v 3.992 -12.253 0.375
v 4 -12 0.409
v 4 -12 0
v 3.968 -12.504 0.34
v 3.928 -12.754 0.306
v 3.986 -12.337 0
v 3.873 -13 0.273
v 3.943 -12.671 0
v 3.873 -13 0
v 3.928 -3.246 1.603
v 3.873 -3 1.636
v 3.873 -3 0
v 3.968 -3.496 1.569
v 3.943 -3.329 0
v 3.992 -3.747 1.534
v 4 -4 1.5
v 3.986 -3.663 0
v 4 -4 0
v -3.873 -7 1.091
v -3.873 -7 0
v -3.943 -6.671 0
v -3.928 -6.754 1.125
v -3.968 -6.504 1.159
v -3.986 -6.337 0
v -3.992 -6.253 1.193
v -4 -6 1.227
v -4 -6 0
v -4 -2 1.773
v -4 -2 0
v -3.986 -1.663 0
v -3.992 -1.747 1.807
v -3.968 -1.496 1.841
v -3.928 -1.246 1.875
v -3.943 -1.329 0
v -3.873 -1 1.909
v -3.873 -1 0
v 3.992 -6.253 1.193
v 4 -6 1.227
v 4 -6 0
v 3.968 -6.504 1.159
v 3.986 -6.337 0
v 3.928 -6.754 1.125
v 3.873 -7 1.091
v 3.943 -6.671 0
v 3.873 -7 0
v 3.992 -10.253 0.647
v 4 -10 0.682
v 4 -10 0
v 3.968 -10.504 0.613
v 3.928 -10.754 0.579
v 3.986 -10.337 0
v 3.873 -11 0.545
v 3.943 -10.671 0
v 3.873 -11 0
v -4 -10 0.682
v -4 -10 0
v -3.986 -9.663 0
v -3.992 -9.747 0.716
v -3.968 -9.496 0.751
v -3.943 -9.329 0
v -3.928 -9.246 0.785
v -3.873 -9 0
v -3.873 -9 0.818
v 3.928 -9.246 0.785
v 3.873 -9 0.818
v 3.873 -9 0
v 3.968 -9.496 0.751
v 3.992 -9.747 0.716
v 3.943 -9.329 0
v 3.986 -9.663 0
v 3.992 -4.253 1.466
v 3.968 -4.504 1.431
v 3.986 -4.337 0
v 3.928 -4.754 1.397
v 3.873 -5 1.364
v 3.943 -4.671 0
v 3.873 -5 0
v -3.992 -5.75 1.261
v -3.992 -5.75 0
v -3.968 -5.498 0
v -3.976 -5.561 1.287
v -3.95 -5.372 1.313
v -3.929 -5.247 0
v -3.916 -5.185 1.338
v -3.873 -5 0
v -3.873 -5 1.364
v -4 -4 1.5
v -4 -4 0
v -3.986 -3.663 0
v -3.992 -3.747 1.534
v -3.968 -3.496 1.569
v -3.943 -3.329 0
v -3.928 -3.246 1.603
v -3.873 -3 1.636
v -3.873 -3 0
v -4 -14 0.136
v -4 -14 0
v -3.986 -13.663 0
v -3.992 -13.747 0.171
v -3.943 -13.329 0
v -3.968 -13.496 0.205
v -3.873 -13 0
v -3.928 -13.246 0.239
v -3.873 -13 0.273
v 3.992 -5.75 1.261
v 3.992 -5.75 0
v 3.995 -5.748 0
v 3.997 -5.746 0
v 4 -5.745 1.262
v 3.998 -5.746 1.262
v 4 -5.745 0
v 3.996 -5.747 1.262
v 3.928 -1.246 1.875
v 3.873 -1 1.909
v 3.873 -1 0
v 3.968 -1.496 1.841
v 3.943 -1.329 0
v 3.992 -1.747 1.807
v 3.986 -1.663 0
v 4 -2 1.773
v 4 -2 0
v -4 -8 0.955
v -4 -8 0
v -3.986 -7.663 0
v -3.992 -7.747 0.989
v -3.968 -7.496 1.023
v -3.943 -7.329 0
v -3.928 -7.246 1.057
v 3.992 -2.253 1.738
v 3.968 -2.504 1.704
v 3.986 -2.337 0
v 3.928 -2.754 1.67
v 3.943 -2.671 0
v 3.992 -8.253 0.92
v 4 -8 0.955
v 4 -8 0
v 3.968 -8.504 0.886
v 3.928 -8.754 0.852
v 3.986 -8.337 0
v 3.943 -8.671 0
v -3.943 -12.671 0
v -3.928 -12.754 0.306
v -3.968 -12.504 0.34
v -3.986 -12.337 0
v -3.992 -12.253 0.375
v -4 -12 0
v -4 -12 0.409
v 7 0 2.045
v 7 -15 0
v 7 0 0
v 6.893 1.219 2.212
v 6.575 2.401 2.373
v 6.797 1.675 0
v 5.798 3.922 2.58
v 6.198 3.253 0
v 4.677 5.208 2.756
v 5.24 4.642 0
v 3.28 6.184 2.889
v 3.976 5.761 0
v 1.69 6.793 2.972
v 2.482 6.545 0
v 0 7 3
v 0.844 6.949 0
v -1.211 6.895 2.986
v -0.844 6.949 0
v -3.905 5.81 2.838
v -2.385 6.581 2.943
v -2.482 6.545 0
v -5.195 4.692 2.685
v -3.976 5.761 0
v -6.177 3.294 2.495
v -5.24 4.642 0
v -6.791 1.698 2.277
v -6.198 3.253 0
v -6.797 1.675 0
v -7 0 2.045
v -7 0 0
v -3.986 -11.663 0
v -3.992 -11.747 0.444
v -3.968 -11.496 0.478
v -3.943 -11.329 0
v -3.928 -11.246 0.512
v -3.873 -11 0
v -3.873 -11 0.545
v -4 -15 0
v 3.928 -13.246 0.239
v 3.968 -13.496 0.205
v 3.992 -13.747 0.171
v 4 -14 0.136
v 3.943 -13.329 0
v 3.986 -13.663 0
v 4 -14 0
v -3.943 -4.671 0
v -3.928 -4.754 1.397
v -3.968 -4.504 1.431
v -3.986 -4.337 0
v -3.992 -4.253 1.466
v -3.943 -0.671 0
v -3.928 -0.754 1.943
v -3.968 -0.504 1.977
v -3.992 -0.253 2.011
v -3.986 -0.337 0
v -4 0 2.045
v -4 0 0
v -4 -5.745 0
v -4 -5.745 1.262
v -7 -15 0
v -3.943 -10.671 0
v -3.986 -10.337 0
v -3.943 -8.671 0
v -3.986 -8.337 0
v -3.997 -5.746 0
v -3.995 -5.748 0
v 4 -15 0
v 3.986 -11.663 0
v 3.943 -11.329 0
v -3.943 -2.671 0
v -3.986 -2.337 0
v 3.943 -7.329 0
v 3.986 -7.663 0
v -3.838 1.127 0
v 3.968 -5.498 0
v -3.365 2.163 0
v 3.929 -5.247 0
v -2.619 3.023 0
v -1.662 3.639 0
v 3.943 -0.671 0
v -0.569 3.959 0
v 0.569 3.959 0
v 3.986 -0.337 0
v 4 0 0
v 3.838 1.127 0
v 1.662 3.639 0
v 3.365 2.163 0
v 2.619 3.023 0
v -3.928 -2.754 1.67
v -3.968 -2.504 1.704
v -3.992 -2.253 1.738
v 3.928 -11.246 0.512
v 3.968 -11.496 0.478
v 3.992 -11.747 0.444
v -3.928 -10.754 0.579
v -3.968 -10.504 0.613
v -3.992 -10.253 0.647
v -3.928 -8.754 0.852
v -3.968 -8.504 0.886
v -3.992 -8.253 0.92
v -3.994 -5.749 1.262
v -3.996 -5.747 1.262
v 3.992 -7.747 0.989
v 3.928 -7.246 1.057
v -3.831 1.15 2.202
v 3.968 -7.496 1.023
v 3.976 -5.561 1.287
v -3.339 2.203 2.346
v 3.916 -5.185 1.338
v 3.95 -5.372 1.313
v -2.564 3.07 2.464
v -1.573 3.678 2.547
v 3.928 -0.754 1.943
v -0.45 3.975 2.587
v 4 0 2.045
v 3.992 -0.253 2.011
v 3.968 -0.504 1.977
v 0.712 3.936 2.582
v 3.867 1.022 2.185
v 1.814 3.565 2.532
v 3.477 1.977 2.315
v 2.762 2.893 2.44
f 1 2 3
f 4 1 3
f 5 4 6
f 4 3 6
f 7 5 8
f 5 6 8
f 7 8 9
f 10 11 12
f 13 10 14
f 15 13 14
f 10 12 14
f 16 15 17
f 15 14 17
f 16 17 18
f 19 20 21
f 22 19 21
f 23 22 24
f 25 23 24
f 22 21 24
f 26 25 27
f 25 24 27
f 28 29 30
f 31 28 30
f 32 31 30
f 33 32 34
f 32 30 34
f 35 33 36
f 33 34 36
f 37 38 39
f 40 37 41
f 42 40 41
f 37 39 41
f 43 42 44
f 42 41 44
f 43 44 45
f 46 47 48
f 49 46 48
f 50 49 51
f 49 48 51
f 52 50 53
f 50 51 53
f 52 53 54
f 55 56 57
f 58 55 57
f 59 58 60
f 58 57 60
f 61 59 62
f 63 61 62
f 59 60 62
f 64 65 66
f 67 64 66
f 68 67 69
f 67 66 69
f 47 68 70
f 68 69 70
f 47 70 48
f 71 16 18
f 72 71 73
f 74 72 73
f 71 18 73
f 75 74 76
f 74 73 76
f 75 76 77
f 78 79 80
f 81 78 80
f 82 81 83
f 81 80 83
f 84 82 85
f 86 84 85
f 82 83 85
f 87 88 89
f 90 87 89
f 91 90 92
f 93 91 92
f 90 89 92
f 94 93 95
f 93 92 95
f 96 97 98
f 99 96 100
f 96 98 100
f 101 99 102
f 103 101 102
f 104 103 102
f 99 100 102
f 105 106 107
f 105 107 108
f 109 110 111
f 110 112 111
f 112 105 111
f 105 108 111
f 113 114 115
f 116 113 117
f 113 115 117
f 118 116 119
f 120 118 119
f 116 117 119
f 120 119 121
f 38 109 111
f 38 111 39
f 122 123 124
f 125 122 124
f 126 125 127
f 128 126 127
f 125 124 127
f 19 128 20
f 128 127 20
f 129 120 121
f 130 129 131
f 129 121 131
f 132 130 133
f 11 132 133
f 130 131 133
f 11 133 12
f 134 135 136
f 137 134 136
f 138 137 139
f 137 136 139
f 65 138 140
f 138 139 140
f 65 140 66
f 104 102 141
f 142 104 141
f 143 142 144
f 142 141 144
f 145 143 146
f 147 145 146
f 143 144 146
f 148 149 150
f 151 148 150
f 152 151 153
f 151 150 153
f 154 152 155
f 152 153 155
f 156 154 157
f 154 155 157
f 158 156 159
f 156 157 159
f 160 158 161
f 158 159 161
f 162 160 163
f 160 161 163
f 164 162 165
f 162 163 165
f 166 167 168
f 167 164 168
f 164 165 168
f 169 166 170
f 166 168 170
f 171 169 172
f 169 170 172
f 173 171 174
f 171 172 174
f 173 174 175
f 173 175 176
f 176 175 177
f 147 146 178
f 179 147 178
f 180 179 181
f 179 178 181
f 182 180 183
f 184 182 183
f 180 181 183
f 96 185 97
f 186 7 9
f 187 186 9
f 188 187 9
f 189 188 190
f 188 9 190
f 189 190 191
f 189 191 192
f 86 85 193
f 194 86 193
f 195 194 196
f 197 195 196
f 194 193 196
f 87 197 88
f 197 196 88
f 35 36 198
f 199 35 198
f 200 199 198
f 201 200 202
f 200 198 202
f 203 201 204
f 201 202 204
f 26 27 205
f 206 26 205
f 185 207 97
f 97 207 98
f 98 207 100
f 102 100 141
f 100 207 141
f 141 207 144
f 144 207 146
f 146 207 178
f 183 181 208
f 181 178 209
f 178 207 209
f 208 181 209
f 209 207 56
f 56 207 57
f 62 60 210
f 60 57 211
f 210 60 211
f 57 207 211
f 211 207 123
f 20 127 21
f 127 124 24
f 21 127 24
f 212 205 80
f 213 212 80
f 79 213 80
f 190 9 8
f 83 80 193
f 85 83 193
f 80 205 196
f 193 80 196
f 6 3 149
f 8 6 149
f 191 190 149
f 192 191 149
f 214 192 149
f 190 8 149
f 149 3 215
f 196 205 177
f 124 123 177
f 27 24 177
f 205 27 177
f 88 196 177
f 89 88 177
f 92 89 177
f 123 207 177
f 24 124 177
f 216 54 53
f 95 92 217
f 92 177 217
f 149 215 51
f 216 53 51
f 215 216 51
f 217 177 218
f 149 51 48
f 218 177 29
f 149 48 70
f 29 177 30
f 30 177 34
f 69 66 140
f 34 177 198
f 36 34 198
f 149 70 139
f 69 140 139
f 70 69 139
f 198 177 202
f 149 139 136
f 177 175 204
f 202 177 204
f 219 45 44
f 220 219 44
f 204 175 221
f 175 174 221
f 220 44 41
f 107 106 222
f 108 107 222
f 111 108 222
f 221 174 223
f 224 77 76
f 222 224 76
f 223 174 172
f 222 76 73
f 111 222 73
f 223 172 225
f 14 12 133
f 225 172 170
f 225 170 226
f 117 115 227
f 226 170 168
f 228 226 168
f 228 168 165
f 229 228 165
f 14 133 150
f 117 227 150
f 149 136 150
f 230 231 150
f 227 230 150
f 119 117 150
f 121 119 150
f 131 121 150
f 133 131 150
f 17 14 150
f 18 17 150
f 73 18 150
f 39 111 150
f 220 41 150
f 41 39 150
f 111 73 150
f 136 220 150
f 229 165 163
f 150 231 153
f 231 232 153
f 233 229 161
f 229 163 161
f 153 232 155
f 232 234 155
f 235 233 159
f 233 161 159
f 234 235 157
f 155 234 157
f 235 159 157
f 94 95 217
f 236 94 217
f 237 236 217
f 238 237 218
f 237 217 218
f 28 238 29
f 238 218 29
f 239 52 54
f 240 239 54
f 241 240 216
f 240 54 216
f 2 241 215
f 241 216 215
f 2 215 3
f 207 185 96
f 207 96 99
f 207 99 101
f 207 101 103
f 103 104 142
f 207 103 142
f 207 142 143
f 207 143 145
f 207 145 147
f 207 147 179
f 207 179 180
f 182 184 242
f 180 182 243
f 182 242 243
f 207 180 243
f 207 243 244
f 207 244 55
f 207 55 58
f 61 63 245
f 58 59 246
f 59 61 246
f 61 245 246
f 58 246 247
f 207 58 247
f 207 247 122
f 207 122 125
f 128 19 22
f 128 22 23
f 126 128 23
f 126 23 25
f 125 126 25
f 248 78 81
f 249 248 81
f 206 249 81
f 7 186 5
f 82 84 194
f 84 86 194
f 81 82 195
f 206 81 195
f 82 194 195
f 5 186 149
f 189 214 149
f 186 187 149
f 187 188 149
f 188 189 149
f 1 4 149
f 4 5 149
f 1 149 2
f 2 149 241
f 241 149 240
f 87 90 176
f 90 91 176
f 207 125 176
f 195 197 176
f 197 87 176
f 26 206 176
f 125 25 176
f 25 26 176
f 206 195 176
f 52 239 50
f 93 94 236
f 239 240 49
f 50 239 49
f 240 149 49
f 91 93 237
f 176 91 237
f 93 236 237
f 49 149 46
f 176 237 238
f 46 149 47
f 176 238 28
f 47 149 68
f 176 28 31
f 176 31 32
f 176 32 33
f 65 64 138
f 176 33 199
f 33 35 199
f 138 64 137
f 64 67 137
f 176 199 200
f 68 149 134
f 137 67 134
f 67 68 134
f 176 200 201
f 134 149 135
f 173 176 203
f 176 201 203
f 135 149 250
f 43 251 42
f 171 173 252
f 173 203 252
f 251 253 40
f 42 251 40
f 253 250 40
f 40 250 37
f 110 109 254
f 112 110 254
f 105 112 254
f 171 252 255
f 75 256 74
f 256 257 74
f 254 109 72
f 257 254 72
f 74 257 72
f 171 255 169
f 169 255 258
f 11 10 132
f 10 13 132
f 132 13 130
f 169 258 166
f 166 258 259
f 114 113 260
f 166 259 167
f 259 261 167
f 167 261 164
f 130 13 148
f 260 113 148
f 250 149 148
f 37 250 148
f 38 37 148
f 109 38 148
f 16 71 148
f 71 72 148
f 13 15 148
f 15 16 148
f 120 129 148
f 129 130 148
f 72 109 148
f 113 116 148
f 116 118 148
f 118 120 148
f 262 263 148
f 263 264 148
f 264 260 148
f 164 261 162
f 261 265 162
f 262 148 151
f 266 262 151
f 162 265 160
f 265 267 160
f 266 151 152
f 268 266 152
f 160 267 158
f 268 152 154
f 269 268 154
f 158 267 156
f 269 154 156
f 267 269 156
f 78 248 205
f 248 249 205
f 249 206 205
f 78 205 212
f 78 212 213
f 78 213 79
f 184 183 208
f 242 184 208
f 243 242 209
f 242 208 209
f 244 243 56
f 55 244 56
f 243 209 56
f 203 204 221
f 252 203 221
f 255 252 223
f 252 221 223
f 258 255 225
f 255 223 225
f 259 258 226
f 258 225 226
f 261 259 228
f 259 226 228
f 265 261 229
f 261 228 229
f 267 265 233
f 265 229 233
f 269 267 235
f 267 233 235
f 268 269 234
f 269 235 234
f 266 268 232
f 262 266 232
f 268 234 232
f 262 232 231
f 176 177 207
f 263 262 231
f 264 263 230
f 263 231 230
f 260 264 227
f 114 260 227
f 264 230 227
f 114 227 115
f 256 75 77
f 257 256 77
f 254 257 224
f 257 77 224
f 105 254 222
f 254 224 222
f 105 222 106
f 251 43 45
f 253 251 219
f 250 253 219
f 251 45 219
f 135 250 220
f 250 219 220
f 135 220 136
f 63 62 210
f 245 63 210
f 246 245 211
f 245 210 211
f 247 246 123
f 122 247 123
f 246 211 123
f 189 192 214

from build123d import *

# Parameters (mm, degrees)
F1_DEPTH = 3
F3_DEPTH = 12.5


with BuildPart() as f1:
    # F0 (on Top) → F1 (new body)
    with BuildSketch(Plane.XY):
        with BuildLine():
            ThreePointArc((-4, -5.7445626465), (-6.204836823, -3.2403703492), (-7, 0))
            Line((-7, 0), (-7, -15))
            Line((-7, -15), (-4, -15))
            Line((-4, -15), (-4, -14))
            Line((-4, -14), (-4, -12))
            Line((-4, -12), (-4, -10))
            Line((-4, -10), (-4, -8))
            Line((-4, -8), (-4, -6))
            Line((-4, -6), (-4, -5.7445626465))
        make_face()
        with BuildLine():
            Line((-4, -2), (-4, 0))
            Line((-4, 0), (-7, 0))
            ThreePointArc((-7, 0), (-6.204836823, -3.2403703492), (-4, -5.7445626465))
            Line((-4, -5.7445626465), (-4, -4))
            Line((-4, -4), (-4, -2))
        make_face()
        with BuildLine():
            ThreePointArc((-4, 0), (0, 4), (4, 0))
            Line((4, 0), (7, 0))
            ThreePointArc((7, 0), (0, 7), (-7, 0))
            Line((-7, 0), (-4, 0))
        make_face()
        with BuildLine():
            Line((7, 0), (4, 0))
            Line((4, 0), (4, -2))
            Line((4, -2), (4, -4))
            Line((4, -4), (4, -5.7445626465))
            ThreePointArc((4, -5.7445626465), (6.204836823, -3.2403703492), (7, 0))
        make_face()
        with BuildLine():
            Line((7, -15), (7, 0))
            ThreePointArc((7, 0), (6.204836823, -3.2403703492), (4, -5.7445626465))
            Line((4, -5.7445626465), (4, -6))
            Line((4, -6), (4, -8))
            Line((4, -8), (4, -10))
            Line((4, -10), (4, -12))
            Line((4, -12), (4, -14))
            Line((4, -14), (4, -15))
            Line((4, -15), (7, -15))
        make_face()
        with BuildLine():
            ThreePointArc((-3.8729833462, -1), (-3.9681187851, -0.5040171699), (-4, 0))
            Line((-4, 0), (-4, -2))
            ThreePointArc((-4, -2), (-3.9681187851, -1.4959828301), (-3.8729833462, -1))
        make_face()
        with BuildLine():
            ThreePointArc((-3.8729833462, -3), (-3.9681187851, -2.5040171699), (-4, -2))
            Line((-4, -2), (-4, -4))
            ThreePointArc((-4, -4), (-3.9681187851, -3.4959828301), (-3.8729833462, -3))
        make_face()
        with BuildLine():
            Line((-4, -4), (-4, -5.7445626465))
            ThreePointArc((-4, -5.7445626465), (-3.9960908526, -5.7472826533), (-3.9921798557, -5.75))
            ThreePointArc((-3.9921798557, -5.75), (-3.9504206166, -5.3721648688), (-3.8729833462, -5))
            ThreePointArc((-3.8729833462, -5), (-3.9681187851, -4.5040171699), (-4, -4))
        make_face()
        with BuildLine():
            ThreePointArc((-3.8729833462, -7), (-3.9681187851, -6.5040171699), (-4, -6))
            Line((-4, -6), (-4, -8))
            ThreePointArc((-4, -8), (-3.9681187851, -7.4959828301), (-3.8729833462, -7))
        make_face()
        with BuildLine():
            ThreePointArc((-3.8729833462, -9), (-3.9681187851, -8.5040171699), (-4, -8))
            Line((-4, -8), (-4, -10))
            ThreePointArc((-4, -10), (-3.9681187851, -9.4959828301), (-3.8729833462, -9))
        make_face()
        with BuildLine():
            ThreePointArc((-3.8729833462, -11), (-3.9681187851, -10.5040171699), (-4, -10))
            Line((-4, -10), (-4, -12))
            ThreePointArc((-4, -12), (-3.9681187851, -11.4959828301), (-3.8729833462, -11))
        make_face()
        with BuildLine():
            Line((-4, -12), (-4, -14))
            ThreePointArc((-4, -14), (-3.9681187851, -13.4959828301), (-3.8729833462, -13))
            ThreePointArc((-3.8729833462, -13), (-3.9681187851, -12.5040171699), (-4, -12))
        make_face()
        with BuildLine():
            ThreePointArc((3.8729833462, -13), (3.9681187851, -13.4959828301), (4, -14))
            Line((4, -14), (4, -12))
            ThreePointArc((4, -12), (3.9681187851, -12.5040171699), (3.8729833462, -13))
        make_face()
        with BuildLine():
            Line((4, -12), (4, -10))
            ThreePointArc((4, -10), (3.9681187851, -10.5040171699), (3.8729833462, -11))
            ThreePointArc((3.8729833462, -11), (3.9681187851, -11.4959828301), (4, -12))
        make_face()
        with BuildLine():
            Line((4, -10), (4, -8))
            ThreePointArc((4, -8), (3.9681187851, -8.5040171699), (3.8729833462, -9))
            ThreePointArc((3.8729833462, -9), (3.9681187851, -9.4959828301), (4, -10))
        make_face()
        with BuildLine():
            Line((4, -8), (4, -6))
            ThreePointArc((4, -6), (3.9681187851, -6.5040171699), (3.8729833462, -7))
            ThreePointArc((3.8729833462, -7), (3.9681187851, -7.4959828301), (4, -8))
        make_face()
        with BuildLine():
            ThreePointArc((3.9921798557, -5.75), (3.9960908526, -5.7472826533), (4, -5.7445626465))
            Line((4, -5.7445626465), (4, -4))
            ThreePointArc((4, -4), (3.9681187851, -4.5040171699), (3.8729833462, -5))
            ThreePointArc((3.8729833462, -5), (3.9504206166, -5.3721648688), (3.9921798557, -5.75))
        make_face()
        with BuildLine():
            Line((4, -4), (4, -2))
            ThreePointArc((4, -2), (3.9681187851, -2.5040171699), (3.8729833462, -3))
            ThreePointArc((3.8729833462, -3), (3.9681187851, -3.4959828301), (4, -4))
        make_face()
        with BuildLine():
            Line((4, -2), (4, 0))
            ThreePointArc((4, 0), (3.9681187851, -0.5040171699), (3.8729833462, -1))
            ThreePointArc((3.8729833462, -1), (3.9681187851, -1.4959828301), (4, -2))
        make_face()
    extrude(amount=F1_DEPTH)

    # F2 (on Right) → F3 (cut, symmetric)
    with BuildSketch(Plane.YZ):
        Polygon((7, 3), (0, 3), (-15, 3), (-15, 0), align=None)
    extrude(amount=F3_DEPTH, both=True, mode=Mode.SUBTRACT)


solid = f1.part
